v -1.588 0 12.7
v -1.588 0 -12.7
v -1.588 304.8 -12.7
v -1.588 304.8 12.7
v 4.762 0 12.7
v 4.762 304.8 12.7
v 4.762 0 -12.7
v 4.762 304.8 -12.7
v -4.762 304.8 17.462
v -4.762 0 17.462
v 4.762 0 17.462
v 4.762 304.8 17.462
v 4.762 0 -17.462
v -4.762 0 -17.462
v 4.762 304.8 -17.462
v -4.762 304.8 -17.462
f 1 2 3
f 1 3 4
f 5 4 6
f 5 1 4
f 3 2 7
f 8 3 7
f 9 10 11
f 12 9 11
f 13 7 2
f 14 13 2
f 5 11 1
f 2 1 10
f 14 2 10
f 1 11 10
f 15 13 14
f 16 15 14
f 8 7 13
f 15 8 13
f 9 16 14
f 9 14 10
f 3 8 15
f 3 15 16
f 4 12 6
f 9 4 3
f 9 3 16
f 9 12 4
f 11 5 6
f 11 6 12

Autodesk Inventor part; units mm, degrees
ref_plane "YZ Plane" through (0, 0, 0) normal (1, 0, 0) x (0, 1, 0)
ref_plane "XZ Plane" through (0, 0, 0) normal (0, 1, 0) x (-1, 0, 0)
ref_plane "XY Plane" through (0, 0, 0) normal (0, 0, 1) x (1, 0, 0)
sketch "Sketch1" plane through (0, 0, 0) normal (0, 1, 0) x (-1, 0, 0)
  line L0 (-4.7625, -17.4625) -> (4.7625, -17.4625)
  line L1 (4.7625, -17.4625) -> (4.7625, 17.4625)
  line L2 (4.7625, 17.4625) -> (-4.7625, 17.4625)
  line L3 (-4.7625, -17.4625) -> (4.7625, 17.4625) construction
  line L4 (4.7625, -17.4625) -> (-4.7625, 17.4625) construction
  line L5 (1.5875, -12.7) -> (1.5875, 12.7)
  line L6 (1.5875, 12.7) -> (-11.1125, -12.7) construction
  line L7 (-11.1125, 12.7) -> (1.5875, -12.7) construction
  line L8 (1.5875, 12.7) -> (-4.7625, 12.7)
  line L9 (1.5875, -12.7) -> (-4.7625, -12.7)
  line L10 (-4.7625, 12.7) -> (-4.7625, 17.4625)
  line L11 (-4.7625, -12.7) -> (-4.7625, -17.4625)
  point P0 (0, 0)
  point P1 (-4.7625, 0)
  dimension "d0" = 9.525
  dimension "d1" = 34.925
  dimension "d2" = 12.7
  dimension "d3" = 25.4
extrude "Extrusion1" add sketch "Sketch1" along normal blind 304.8
properties part number "14in-slide-pt_2" material "Aluminum 6061"
